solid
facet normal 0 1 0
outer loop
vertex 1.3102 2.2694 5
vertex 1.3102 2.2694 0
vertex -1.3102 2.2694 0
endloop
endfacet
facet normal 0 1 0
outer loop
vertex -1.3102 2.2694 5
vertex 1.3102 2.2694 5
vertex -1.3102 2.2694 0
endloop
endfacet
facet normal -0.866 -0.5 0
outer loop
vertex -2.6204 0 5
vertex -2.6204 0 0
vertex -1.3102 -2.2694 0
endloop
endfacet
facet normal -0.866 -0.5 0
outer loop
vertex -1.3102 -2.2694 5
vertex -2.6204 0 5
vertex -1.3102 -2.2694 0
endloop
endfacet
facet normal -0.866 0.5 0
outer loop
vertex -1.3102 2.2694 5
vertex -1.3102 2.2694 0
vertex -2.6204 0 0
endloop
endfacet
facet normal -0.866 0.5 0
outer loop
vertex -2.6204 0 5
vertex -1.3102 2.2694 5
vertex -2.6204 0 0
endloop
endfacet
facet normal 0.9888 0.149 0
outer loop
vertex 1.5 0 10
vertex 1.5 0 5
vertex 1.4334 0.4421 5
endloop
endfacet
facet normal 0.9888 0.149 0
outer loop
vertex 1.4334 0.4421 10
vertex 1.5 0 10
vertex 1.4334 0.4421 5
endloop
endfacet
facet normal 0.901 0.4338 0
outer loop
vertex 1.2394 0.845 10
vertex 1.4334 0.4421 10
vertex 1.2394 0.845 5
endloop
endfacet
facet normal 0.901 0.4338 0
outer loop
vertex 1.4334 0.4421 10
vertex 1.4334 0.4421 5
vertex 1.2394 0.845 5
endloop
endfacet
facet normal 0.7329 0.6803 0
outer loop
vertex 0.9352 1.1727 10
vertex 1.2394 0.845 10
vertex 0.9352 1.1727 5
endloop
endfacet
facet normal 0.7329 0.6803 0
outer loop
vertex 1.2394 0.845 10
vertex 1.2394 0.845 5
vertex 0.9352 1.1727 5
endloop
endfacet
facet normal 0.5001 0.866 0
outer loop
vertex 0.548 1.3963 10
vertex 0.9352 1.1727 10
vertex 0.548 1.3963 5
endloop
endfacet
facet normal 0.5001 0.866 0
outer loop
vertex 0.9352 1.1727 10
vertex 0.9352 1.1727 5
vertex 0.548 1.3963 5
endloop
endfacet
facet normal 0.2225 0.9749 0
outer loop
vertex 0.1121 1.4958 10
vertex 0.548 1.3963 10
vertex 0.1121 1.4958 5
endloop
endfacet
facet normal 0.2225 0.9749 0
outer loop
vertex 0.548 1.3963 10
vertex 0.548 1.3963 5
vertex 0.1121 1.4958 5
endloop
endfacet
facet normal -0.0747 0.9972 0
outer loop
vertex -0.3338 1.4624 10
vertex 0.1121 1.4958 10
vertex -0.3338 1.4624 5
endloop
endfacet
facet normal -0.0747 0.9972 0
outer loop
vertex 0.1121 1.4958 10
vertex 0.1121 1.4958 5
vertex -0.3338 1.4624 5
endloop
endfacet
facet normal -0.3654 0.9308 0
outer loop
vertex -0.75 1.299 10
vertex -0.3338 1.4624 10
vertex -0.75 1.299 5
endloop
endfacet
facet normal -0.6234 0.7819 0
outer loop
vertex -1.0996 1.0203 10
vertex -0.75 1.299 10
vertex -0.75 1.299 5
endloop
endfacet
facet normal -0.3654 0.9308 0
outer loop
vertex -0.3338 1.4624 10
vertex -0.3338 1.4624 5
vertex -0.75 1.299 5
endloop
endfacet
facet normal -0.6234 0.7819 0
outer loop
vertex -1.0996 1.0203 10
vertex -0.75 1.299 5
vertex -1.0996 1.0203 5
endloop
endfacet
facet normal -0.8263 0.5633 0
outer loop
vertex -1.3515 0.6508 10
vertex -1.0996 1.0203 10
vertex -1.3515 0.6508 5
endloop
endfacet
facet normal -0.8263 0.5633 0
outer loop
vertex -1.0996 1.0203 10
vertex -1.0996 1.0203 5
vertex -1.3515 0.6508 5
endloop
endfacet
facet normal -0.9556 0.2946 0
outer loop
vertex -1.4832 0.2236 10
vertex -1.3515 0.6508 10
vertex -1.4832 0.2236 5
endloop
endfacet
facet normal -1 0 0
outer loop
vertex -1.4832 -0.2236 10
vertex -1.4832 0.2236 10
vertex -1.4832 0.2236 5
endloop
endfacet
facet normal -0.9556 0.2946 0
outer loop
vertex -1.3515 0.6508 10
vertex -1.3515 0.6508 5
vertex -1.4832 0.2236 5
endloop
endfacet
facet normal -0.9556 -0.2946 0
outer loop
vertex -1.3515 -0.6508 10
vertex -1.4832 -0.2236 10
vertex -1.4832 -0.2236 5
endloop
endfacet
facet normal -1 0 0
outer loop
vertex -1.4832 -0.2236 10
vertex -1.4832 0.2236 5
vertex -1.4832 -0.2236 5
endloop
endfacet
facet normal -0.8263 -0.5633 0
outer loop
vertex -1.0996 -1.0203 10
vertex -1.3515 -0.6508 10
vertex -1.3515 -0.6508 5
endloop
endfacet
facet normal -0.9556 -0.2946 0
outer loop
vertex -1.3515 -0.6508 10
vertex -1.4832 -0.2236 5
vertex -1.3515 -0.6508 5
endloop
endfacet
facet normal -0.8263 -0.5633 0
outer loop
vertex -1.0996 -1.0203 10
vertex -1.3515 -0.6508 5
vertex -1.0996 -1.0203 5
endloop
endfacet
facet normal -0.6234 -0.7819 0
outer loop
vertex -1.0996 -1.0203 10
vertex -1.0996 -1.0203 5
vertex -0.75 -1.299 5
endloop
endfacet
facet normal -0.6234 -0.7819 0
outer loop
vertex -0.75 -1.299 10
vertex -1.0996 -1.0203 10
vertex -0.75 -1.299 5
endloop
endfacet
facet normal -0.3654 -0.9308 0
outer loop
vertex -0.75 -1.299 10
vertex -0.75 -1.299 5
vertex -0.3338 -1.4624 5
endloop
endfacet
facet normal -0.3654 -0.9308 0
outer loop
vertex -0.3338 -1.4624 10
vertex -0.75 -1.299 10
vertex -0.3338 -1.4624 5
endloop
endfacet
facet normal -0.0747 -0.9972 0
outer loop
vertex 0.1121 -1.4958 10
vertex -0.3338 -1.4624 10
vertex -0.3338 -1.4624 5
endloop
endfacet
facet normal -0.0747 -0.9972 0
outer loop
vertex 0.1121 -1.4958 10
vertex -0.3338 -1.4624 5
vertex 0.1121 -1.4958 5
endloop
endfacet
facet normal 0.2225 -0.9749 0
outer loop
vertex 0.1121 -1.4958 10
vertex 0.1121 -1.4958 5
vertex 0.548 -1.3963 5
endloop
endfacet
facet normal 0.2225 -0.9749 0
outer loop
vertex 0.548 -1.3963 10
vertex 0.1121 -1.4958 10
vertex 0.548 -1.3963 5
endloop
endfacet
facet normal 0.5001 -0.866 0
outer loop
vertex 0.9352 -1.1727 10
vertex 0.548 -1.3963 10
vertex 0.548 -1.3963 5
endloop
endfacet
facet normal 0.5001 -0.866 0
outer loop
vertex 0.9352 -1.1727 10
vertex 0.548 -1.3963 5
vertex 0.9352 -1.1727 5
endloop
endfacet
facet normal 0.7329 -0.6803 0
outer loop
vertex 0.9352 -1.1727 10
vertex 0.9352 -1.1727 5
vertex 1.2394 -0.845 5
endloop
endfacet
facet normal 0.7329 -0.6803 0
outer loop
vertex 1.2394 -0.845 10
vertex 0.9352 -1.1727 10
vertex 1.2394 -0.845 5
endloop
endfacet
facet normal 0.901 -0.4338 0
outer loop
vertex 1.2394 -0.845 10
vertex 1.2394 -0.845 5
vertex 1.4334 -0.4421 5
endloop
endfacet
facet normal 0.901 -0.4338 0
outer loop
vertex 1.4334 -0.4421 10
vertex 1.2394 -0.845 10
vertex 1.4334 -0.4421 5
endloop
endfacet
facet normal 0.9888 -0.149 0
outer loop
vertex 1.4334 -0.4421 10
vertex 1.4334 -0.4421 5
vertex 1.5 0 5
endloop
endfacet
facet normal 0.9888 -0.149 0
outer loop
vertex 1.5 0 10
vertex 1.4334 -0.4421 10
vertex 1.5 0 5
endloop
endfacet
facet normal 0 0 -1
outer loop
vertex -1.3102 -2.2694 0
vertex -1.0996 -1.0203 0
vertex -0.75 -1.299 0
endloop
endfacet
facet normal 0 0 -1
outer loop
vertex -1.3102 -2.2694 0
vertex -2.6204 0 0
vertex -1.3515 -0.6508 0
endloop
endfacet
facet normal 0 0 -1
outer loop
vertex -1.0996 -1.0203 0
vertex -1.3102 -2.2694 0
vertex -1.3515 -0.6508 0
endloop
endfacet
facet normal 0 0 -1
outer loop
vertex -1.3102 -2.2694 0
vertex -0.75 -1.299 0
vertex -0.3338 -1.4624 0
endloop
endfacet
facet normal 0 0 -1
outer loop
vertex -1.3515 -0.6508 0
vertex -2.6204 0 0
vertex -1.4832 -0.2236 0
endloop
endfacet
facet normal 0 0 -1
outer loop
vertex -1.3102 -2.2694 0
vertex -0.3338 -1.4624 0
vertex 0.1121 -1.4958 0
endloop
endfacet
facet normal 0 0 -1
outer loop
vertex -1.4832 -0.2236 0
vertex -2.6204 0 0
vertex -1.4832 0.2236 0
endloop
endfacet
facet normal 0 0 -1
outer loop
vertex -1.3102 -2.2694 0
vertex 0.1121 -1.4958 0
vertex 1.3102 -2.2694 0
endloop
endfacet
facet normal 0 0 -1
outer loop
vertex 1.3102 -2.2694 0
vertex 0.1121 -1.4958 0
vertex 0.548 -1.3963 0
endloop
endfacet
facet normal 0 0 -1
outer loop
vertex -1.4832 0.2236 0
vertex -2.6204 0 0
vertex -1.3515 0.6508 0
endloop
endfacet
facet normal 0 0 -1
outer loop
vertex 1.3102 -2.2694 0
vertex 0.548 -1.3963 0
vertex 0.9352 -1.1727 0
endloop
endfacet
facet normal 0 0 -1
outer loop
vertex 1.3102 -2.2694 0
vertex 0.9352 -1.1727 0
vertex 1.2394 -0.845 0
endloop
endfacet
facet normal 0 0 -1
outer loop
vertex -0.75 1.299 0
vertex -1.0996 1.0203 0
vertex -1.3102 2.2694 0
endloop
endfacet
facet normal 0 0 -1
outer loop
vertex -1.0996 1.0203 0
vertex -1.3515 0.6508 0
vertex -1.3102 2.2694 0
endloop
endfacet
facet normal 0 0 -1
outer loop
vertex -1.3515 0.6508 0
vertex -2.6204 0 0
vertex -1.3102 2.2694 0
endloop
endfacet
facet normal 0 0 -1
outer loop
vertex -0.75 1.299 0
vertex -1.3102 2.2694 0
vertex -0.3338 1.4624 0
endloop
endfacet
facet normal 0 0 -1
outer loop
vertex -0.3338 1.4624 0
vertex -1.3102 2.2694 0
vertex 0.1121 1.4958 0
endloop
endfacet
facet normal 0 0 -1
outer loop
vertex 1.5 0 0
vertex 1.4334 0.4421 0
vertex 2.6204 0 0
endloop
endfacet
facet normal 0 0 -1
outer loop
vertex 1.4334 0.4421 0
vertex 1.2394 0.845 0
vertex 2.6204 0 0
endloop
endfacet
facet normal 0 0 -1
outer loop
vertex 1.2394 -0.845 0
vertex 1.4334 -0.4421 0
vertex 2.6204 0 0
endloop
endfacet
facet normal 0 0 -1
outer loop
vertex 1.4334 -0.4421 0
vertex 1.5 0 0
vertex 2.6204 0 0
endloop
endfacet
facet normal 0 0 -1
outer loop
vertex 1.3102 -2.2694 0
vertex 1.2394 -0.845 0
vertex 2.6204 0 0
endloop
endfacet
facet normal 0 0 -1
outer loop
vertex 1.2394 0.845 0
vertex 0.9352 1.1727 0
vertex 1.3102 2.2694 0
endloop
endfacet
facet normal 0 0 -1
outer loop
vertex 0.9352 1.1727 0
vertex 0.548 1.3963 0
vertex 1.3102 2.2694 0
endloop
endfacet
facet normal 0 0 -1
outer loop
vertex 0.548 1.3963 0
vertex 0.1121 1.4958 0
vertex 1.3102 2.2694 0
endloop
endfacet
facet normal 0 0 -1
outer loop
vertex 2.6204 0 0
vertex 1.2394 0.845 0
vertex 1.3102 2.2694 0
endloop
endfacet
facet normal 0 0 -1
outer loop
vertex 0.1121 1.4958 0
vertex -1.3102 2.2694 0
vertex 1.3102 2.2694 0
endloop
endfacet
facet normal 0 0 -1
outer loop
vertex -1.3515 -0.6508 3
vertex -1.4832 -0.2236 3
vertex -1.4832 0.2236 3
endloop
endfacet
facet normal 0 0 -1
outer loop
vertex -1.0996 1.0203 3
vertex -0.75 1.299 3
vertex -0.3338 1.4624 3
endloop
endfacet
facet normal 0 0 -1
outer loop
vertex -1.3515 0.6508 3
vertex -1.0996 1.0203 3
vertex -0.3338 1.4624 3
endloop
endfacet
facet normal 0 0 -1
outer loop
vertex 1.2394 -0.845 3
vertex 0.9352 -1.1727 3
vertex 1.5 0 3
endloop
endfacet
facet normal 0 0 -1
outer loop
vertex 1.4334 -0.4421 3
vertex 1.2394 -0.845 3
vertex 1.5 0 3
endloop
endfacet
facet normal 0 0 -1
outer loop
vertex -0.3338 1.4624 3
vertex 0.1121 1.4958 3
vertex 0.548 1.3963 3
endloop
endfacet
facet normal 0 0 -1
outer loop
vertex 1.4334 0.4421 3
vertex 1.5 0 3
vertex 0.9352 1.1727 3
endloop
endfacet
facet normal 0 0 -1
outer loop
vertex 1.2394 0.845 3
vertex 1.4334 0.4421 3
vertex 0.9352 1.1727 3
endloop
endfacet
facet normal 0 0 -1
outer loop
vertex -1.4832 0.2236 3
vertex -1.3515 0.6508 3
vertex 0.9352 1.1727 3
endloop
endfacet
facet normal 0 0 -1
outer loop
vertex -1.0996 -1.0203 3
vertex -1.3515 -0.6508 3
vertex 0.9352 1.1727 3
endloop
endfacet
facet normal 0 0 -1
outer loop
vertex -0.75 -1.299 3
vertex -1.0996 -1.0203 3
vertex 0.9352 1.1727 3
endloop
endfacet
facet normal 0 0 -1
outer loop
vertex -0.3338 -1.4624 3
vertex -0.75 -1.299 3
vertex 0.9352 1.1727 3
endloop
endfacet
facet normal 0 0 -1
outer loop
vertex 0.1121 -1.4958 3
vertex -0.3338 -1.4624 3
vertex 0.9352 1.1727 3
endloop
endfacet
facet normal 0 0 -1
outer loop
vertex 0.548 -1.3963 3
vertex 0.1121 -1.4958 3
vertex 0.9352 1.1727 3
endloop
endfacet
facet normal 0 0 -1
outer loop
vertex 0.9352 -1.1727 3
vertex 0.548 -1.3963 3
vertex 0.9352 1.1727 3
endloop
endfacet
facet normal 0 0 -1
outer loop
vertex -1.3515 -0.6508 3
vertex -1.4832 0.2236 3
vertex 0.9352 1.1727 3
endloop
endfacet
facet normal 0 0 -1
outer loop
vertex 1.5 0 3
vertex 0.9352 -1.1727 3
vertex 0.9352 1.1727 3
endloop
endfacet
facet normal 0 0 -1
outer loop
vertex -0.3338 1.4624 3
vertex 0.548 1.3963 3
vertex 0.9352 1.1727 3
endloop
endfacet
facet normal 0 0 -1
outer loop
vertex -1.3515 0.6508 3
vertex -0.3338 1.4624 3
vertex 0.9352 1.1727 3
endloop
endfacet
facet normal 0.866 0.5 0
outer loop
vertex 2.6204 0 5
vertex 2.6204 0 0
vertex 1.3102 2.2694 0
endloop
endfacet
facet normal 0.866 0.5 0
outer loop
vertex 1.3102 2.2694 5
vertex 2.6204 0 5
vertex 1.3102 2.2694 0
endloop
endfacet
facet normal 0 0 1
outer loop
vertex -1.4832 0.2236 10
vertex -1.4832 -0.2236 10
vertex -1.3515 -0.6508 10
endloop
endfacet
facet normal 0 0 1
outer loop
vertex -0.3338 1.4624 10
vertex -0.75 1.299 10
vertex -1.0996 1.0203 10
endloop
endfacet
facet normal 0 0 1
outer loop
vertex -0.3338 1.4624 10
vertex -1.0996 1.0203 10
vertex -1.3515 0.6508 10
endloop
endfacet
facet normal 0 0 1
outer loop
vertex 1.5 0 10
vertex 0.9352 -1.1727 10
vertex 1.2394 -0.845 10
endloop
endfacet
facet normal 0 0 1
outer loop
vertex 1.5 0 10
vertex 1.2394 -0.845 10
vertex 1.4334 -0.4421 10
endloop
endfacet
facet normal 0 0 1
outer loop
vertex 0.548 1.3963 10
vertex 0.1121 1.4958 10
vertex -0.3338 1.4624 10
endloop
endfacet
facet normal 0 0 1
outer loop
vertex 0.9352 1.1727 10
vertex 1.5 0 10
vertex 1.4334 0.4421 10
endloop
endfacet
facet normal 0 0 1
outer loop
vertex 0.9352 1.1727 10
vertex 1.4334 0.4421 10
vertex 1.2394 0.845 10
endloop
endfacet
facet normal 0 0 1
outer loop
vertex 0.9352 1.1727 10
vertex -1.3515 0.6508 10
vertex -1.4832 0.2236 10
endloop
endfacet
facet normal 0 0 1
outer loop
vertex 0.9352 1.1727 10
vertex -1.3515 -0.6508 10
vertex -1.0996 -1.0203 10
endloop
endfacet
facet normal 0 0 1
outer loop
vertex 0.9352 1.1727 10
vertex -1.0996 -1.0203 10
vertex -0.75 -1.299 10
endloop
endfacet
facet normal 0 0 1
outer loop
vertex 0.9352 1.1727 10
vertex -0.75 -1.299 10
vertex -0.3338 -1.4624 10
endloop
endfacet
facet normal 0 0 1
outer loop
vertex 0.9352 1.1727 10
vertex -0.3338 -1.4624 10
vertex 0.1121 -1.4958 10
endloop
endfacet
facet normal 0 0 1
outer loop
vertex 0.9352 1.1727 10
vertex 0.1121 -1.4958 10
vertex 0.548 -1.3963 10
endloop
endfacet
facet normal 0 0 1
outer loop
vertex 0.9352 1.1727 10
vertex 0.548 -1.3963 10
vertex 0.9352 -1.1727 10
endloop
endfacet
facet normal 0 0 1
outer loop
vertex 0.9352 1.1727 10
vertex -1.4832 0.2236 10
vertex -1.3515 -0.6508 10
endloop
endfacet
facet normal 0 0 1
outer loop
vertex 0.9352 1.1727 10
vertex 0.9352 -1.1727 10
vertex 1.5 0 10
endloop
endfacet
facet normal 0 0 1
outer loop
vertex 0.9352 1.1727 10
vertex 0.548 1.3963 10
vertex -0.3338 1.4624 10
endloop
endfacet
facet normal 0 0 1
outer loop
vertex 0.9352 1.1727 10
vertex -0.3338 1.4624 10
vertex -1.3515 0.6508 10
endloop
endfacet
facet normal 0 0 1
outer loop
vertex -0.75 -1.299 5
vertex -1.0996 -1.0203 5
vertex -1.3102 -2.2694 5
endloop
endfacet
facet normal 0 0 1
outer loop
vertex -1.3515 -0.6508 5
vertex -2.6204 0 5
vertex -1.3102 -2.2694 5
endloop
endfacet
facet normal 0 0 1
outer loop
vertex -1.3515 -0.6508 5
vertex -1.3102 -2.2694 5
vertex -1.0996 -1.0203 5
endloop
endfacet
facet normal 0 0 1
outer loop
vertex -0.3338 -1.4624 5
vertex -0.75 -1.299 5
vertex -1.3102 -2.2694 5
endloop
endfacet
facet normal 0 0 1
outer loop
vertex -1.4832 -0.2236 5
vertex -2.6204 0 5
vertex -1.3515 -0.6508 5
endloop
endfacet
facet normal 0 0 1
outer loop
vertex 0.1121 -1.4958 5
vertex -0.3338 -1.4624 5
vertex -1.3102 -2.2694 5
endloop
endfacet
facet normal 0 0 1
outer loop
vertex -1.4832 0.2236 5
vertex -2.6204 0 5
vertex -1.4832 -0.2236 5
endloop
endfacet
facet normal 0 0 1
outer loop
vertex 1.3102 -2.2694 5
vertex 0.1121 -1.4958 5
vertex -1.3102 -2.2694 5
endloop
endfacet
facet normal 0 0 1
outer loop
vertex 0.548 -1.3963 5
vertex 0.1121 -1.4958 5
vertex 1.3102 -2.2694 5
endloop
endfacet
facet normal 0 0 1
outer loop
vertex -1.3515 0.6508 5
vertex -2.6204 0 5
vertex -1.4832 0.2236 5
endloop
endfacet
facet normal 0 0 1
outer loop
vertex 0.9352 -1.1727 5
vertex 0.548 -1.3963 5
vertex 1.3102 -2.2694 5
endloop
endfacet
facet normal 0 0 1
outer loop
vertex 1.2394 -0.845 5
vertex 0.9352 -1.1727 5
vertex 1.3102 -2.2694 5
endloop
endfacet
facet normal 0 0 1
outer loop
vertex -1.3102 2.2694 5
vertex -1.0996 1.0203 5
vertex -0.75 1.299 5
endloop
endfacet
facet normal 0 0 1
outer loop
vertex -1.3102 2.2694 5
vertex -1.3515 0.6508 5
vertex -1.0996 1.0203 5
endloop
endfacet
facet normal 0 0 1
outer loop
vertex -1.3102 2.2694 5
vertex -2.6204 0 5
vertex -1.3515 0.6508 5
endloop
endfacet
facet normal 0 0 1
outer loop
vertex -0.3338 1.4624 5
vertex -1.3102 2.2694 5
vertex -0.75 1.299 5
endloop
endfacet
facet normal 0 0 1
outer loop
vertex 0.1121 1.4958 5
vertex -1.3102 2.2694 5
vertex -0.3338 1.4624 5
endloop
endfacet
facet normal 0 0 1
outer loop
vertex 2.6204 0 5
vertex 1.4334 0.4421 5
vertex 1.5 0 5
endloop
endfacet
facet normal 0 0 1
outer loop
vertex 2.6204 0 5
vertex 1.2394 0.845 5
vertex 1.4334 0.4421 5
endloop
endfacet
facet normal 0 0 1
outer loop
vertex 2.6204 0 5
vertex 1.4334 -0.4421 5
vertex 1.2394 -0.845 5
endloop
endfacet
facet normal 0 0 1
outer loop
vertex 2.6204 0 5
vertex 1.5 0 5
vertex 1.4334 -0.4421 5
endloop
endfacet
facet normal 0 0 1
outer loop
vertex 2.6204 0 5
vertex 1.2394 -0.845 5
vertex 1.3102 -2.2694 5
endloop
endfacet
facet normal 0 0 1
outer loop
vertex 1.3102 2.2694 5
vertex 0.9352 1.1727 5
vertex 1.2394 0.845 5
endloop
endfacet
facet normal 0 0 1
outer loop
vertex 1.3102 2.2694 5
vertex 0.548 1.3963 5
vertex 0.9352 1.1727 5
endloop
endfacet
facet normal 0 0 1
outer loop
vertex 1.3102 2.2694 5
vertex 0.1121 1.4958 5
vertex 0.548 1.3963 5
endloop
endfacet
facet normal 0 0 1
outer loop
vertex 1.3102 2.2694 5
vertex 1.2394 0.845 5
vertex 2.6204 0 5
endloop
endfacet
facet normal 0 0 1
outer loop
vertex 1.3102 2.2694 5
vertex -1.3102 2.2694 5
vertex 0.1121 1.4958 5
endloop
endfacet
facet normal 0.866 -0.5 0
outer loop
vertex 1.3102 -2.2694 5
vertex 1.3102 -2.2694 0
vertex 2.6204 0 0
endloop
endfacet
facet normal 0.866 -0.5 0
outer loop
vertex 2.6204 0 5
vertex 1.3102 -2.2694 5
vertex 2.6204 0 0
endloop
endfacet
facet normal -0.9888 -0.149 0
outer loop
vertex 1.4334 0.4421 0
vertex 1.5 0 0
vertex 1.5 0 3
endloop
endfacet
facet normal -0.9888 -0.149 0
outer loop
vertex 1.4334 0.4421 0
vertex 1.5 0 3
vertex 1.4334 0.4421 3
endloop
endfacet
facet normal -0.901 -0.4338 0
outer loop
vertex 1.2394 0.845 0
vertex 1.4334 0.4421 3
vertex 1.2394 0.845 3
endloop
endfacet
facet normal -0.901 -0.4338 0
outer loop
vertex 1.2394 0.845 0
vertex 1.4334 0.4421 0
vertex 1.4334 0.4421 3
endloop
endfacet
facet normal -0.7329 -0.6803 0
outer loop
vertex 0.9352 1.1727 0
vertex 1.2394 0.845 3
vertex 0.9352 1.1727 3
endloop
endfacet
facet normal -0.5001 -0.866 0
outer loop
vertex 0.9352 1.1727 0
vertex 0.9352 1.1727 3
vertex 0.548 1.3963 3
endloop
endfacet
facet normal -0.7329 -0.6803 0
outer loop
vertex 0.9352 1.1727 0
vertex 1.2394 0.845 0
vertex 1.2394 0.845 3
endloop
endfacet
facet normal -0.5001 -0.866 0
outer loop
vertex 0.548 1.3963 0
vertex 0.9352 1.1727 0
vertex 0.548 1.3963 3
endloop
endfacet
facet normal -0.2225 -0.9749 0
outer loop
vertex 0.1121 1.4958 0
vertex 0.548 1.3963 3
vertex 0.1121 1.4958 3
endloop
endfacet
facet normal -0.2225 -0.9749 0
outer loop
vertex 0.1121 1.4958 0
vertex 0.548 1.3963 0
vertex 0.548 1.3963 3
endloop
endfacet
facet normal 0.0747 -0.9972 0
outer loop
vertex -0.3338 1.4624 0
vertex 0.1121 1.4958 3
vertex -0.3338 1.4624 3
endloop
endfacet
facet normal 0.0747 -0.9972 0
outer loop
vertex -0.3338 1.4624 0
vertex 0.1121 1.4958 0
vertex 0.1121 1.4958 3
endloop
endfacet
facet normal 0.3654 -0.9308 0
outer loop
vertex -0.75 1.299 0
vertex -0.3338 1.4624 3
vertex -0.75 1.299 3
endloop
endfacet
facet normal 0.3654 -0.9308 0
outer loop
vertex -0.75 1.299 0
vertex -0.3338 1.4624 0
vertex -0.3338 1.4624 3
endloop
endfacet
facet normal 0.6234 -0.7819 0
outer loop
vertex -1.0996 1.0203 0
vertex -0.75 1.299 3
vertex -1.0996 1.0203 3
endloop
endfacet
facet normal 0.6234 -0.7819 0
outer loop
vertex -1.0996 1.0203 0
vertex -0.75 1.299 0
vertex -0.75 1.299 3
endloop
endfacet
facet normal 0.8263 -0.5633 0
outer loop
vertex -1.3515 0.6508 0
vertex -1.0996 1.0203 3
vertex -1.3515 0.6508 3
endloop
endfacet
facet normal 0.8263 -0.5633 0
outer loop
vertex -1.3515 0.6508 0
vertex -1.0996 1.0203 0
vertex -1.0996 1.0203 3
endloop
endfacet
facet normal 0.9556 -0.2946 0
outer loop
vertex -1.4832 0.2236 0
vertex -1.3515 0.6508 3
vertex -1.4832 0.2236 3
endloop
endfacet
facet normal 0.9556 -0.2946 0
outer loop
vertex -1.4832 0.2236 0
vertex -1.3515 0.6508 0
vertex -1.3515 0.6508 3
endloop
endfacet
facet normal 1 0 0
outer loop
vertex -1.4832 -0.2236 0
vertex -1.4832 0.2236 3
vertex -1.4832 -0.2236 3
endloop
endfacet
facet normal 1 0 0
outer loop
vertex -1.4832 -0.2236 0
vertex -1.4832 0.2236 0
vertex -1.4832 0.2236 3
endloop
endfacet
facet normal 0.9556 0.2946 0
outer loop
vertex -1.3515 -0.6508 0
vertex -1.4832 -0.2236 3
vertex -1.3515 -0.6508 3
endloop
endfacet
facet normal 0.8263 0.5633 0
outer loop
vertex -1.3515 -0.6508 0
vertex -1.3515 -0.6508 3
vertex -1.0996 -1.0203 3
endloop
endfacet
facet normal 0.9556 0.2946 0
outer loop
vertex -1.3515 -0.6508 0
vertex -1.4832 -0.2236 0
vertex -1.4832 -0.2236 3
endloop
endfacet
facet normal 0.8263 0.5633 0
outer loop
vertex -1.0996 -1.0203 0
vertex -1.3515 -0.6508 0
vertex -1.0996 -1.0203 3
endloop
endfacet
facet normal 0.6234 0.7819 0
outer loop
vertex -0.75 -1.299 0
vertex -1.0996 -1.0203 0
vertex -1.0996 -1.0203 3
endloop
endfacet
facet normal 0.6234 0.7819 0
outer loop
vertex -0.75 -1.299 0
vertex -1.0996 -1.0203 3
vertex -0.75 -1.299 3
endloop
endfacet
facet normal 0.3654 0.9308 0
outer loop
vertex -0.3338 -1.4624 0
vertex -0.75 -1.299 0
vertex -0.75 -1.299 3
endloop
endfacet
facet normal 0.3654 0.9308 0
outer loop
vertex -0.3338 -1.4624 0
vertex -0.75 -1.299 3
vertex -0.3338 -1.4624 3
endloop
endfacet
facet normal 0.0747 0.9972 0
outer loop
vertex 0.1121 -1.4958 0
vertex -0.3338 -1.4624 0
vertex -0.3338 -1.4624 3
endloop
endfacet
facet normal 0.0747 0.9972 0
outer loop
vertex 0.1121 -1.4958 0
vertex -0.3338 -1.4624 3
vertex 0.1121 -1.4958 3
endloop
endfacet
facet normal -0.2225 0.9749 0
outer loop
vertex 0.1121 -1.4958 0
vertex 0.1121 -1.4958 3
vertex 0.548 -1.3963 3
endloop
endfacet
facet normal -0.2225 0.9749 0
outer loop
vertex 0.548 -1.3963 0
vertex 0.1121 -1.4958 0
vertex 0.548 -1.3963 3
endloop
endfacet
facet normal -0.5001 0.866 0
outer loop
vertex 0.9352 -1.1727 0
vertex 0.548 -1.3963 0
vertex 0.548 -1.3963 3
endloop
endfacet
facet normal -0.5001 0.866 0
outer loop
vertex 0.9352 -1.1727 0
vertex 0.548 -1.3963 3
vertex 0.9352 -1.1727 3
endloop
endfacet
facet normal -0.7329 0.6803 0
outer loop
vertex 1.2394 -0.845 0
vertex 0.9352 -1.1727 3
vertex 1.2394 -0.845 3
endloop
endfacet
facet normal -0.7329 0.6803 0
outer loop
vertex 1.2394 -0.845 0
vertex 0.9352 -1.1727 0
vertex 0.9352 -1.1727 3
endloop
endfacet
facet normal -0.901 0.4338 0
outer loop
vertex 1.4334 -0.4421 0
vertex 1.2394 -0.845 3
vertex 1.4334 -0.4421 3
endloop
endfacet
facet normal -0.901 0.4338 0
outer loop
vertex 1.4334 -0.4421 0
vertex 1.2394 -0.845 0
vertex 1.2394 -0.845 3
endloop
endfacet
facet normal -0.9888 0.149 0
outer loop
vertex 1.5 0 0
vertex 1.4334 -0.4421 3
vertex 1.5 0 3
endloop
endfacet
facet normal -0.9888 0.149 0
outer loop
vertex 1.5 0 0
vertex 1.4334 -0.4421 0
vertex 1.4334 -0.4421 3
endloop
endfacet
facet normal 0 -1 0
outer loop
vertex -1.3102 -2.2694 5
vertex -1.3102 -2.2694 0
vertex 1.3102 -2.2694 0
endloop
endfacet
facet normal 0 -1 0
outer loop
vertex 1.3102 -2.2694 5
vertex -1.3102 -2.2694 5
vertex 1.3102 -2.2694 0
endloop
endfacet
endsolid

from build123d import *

# Parameters (mm, degrees)
F0_R     = 1.5
F1_DEPTH = 10
F2_DEPTH = 5
F3_DEPTH = 3


with BuildPart() as f1:
    # F0 (on Top) → F1 (new body)
    with BuildSketch(Plane.XY):
        Circle(F0_R)
    extrude(amount=F1_DEPTH)

    # F0 (on Top) → F2 (join)
    with BuildSketch(Plane.XY):
        Polygon((1.31021, 2.26935), (-1.31021, 2.26935), (-2.62042, 0), (-1.31021, -2.26935), (1.31021, -2.26935), (2.62042, 0), align=None)
        Circle(F0_R, mode=Mode.SUBTRACT)
    extrude(amount=F2_DEPTH)

    # F0 (on Top) → F3 (cut)
    with BuildSketch(Plane.XY):
        Circle(F0_R)
    extrude(amount=F3_DEPTH, mode=Mode.SUBTRACT)


solid = f1.part
